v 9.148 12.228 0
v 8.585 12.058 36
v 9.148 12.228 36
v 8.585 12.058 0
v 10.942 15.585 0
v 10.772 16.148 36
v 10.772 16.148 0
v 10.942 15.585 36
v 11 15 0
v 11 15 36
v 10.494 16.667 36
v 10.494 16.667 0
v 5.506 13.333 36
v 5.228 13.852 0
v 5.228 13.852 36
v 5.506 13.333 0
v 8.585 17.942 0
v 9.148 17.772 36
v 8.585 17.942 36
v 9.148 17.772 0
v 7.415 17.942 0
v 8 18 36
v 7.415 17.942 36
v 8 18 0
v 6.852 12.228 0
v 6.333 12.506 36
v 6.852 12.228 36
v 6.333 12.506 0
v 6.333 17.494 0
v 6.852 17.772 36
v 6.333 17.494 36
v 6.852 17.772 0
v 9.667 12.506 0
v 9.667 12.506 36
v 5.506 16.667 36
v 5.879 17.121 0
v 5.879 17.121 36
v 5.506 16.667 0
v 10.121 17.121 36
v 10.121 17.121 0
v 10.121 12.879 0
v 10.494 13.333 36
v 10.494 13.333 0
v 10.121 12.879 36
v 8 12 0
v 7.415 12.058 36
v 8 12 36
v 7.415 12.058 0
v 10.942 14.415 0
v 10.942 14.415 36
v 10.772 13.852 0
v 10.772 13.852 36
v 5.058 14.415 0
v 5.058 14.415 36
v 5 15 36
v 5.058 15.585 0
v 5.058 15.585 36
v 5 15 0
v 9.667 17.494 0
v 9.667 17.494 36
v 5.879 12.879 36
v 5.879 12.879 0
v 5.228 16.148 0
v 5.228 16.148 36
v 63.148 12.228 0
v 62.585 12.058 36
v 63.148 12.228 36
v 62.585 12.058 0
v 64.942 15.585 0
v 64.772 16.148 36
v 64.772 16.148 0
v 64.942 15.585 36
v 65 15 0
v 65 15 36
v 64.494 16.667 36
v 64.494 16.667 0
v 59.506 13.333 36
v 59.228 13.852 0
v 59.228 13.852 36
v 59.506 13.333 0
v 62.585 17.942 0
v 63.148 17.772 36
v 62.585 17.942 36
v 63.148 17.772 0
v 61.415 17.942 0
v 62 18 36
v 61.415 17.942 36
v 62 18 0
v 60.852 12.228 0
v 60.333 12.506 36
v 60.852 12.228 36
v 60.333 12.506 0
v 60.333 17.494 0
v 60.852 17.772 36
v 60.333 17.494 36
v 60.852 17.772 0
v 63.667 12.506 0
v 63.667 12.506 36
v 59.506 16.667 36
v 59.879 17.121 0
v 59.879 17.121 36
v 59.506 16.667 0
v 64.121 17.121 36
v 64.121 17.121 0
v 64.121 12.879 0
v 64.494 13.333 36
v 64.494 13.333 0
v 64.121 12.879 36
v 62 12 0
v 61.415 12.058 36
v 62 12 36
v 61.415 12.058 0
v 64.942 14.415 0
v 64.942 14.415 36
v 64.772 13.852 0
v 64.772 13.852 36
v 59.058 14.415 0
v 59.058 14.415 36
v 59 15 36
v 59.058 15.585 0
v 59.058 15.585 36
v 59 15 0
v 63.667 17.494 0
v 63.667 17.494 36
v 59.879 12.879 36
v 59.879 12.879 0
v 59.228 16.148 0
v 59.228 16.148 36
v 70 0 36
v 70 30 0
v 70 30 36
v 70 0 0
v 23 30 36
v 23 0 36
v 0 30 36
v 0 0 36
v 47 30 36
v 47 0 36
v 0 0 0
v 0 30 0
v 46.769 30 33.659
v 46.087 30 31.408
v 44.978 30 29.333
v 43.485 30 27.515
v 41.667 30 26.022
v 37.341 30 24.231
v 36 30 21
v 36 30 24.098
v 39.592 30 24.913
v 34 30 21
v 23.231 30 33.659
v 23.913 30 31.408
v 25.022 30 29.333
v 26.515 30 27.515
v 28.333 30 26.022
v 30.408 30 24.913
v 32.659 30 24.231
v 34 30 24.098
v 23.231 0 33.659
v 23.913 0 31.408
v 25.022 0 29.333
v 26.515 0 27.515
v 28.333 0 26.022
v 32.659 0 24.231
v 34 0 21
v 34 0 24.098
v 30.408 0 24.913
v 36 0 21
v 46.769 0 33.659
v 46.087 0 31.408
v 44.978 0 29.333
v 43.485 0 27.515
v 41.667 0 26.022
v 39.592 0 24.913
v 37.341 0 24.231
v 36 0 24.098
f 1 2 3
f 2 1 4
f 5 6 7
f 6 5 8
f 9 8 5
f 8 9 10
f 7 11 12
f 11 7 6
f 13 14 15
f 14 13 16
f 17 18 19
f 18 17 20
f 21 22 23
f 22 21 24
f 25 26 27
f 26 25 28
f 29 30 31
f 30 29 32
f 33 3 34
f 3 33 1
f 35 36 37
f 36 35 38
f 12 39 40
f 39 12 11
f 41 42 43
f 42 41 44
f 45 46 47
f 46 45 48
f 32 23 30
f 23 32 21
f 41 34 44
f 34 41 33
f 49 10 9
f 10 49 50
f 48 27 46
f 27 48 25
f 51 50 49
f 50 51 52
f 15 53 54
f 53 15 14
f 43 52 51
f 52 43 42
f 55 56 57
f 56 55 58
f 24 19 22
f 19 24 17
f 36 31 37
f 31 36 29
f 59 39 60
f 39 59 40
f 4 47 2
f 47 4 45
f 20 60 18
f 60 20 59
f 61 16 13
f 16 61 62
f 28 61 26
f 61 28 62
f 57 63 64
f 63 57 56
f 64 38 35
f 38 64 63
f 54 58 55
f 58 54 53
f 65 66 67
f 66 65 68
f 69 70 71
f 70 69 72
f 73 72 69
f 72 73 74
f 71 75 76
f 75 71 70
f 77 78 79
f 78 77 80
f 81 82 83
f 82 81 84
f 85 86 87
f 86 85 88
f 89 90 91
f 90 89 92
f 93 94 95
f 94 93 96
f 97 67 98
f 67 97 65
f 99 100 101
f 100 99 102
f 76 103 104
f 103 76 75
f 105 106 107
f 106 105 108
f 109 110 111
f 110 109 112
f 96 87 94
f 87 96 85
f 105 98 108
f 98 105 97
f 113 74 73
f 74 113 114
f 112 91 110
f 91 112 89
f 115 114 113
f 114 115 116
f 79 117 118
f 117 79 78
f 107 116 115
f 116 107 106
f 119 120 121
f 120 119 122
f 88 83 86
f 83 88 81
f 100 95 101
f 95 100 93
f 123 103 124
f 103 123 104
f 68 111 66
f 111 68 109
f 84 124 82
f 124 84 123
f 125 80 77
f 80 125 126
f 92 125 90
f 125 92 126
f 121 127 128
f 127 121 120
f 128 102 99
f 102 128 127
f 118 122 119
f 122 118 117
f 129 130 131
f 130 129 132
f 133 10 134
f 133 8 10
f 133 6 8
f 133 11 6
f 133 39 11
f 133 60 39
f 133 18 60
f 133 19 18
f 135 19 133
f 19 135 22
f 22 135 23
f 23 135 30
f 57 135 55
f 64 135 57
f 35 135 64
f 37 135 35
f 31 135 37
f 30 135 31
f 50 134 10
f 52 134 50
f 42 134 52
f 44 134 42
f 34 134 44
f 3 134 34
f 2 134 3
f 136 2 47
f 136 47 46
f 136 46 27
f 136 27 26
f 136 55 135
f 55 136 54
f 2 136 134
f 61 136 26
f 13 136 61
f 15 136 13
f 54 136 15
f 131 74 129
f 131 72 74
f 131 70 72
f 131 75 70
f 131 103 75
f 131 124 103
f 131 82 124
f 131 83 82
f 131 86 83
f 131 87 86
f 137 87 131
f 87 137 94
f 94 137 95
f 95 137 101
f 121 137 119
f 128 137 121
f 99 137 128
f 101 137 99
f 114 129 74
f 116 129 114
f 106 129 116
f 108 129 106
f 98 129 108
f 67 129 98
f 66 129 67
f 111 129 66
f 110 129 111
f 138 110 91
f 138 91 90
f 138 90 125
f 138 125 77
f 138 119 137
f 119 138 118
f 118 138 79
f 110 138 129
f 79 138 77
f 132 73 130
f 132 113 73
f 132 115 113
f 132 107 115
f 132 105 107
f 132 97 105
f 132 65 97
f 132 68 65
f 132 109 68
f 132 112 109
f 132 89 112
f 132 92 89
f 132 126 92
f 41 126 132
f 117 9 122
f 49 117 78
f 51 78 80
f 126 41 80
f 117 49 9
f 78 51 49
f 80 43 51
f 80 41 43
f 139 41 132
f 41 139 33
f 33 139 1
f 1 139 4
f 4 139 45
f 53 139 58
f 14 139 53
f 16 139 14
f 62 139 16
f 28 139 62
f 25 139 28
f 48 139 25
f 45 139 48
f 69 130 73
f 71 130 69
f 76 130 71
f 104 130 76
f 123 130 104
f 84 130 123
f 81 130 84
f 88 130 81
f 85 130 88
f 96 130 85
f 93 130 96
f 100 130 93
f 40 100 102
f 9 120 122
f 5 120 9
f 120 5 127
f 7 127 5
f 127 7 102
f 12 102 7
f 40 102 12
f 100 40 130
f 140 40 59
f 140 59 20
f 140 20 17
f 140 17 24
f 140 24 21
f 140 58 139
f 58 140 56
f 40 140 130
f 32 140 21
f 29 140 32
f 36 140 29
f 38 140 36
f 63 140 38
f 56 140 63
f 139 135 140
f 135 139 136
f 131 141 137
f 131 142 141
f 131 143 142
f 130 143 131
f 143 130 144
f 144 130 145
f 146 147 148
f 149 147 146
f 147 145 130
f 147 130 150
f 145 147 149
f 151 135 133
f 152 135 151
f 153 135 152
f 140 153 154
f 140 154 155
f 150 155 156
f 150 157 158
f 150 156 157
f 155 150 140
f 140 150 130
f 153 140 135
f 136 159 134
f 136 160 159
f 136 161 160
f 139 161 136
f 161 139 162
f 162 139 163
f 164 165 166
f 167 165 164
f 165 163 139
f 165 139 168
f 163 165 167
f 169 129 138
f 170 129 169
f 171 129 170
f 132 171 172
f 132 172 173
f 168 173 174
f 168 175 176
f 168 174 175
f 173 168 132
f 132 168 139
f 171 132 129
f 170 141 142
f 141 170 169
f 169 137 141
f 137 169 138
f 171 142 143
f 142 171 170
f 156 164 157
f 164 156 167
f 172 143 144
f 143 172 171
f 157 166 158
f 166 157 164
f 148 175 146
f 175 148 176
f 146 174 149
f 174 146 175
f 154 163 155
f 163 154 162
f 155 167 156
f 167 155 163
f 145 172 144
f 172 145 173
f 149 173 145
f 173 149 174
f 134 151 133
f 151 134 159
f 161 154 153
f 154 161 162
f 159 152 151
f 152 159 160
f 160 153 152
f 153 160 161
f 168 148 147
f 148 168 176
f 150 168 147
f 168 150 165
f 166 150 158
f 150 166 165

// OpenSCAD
$fn = 32;

// ----------------------------------------------------------------------
// Saddle clamp: split shaft clamp
// ----------------------------------------------------------------------

// --- parameters (mm) ---
blk_l = 70;               // block length, X
blk_w = 30;               // block width, Y
blk_h = 36;               // block height
clamp_r = 12;             // shaft groove radius
hole_r = 3;               // bolt hole radius
hole_m = 8;               // bolt hole margin from the ends
saw_w = 2;                // saw kerf width

saw_depth = clamp_r + 3;  // saw kerf depth

difference() {
  cube([blk_l, blk_w, blk_h]);
  translate([blk_l / 2, -1, blk_h])
    rotate([-90, 0, 0])
      cylinder(h = blk_w + 2, r = clamp_r);
  for (sx = [0, 1])
    translate([sx ? blk_l - hole_m : hole_m, blk_w / 2, -1])
      cylinder(r = hole_r, h = blk_h + 2);
  translate([blk_l / 2 - saw_w / 2, -1, blk_h - saw_depth])
    cube([saw_w, blk_w + 2, saw_depth + 1]);
}
